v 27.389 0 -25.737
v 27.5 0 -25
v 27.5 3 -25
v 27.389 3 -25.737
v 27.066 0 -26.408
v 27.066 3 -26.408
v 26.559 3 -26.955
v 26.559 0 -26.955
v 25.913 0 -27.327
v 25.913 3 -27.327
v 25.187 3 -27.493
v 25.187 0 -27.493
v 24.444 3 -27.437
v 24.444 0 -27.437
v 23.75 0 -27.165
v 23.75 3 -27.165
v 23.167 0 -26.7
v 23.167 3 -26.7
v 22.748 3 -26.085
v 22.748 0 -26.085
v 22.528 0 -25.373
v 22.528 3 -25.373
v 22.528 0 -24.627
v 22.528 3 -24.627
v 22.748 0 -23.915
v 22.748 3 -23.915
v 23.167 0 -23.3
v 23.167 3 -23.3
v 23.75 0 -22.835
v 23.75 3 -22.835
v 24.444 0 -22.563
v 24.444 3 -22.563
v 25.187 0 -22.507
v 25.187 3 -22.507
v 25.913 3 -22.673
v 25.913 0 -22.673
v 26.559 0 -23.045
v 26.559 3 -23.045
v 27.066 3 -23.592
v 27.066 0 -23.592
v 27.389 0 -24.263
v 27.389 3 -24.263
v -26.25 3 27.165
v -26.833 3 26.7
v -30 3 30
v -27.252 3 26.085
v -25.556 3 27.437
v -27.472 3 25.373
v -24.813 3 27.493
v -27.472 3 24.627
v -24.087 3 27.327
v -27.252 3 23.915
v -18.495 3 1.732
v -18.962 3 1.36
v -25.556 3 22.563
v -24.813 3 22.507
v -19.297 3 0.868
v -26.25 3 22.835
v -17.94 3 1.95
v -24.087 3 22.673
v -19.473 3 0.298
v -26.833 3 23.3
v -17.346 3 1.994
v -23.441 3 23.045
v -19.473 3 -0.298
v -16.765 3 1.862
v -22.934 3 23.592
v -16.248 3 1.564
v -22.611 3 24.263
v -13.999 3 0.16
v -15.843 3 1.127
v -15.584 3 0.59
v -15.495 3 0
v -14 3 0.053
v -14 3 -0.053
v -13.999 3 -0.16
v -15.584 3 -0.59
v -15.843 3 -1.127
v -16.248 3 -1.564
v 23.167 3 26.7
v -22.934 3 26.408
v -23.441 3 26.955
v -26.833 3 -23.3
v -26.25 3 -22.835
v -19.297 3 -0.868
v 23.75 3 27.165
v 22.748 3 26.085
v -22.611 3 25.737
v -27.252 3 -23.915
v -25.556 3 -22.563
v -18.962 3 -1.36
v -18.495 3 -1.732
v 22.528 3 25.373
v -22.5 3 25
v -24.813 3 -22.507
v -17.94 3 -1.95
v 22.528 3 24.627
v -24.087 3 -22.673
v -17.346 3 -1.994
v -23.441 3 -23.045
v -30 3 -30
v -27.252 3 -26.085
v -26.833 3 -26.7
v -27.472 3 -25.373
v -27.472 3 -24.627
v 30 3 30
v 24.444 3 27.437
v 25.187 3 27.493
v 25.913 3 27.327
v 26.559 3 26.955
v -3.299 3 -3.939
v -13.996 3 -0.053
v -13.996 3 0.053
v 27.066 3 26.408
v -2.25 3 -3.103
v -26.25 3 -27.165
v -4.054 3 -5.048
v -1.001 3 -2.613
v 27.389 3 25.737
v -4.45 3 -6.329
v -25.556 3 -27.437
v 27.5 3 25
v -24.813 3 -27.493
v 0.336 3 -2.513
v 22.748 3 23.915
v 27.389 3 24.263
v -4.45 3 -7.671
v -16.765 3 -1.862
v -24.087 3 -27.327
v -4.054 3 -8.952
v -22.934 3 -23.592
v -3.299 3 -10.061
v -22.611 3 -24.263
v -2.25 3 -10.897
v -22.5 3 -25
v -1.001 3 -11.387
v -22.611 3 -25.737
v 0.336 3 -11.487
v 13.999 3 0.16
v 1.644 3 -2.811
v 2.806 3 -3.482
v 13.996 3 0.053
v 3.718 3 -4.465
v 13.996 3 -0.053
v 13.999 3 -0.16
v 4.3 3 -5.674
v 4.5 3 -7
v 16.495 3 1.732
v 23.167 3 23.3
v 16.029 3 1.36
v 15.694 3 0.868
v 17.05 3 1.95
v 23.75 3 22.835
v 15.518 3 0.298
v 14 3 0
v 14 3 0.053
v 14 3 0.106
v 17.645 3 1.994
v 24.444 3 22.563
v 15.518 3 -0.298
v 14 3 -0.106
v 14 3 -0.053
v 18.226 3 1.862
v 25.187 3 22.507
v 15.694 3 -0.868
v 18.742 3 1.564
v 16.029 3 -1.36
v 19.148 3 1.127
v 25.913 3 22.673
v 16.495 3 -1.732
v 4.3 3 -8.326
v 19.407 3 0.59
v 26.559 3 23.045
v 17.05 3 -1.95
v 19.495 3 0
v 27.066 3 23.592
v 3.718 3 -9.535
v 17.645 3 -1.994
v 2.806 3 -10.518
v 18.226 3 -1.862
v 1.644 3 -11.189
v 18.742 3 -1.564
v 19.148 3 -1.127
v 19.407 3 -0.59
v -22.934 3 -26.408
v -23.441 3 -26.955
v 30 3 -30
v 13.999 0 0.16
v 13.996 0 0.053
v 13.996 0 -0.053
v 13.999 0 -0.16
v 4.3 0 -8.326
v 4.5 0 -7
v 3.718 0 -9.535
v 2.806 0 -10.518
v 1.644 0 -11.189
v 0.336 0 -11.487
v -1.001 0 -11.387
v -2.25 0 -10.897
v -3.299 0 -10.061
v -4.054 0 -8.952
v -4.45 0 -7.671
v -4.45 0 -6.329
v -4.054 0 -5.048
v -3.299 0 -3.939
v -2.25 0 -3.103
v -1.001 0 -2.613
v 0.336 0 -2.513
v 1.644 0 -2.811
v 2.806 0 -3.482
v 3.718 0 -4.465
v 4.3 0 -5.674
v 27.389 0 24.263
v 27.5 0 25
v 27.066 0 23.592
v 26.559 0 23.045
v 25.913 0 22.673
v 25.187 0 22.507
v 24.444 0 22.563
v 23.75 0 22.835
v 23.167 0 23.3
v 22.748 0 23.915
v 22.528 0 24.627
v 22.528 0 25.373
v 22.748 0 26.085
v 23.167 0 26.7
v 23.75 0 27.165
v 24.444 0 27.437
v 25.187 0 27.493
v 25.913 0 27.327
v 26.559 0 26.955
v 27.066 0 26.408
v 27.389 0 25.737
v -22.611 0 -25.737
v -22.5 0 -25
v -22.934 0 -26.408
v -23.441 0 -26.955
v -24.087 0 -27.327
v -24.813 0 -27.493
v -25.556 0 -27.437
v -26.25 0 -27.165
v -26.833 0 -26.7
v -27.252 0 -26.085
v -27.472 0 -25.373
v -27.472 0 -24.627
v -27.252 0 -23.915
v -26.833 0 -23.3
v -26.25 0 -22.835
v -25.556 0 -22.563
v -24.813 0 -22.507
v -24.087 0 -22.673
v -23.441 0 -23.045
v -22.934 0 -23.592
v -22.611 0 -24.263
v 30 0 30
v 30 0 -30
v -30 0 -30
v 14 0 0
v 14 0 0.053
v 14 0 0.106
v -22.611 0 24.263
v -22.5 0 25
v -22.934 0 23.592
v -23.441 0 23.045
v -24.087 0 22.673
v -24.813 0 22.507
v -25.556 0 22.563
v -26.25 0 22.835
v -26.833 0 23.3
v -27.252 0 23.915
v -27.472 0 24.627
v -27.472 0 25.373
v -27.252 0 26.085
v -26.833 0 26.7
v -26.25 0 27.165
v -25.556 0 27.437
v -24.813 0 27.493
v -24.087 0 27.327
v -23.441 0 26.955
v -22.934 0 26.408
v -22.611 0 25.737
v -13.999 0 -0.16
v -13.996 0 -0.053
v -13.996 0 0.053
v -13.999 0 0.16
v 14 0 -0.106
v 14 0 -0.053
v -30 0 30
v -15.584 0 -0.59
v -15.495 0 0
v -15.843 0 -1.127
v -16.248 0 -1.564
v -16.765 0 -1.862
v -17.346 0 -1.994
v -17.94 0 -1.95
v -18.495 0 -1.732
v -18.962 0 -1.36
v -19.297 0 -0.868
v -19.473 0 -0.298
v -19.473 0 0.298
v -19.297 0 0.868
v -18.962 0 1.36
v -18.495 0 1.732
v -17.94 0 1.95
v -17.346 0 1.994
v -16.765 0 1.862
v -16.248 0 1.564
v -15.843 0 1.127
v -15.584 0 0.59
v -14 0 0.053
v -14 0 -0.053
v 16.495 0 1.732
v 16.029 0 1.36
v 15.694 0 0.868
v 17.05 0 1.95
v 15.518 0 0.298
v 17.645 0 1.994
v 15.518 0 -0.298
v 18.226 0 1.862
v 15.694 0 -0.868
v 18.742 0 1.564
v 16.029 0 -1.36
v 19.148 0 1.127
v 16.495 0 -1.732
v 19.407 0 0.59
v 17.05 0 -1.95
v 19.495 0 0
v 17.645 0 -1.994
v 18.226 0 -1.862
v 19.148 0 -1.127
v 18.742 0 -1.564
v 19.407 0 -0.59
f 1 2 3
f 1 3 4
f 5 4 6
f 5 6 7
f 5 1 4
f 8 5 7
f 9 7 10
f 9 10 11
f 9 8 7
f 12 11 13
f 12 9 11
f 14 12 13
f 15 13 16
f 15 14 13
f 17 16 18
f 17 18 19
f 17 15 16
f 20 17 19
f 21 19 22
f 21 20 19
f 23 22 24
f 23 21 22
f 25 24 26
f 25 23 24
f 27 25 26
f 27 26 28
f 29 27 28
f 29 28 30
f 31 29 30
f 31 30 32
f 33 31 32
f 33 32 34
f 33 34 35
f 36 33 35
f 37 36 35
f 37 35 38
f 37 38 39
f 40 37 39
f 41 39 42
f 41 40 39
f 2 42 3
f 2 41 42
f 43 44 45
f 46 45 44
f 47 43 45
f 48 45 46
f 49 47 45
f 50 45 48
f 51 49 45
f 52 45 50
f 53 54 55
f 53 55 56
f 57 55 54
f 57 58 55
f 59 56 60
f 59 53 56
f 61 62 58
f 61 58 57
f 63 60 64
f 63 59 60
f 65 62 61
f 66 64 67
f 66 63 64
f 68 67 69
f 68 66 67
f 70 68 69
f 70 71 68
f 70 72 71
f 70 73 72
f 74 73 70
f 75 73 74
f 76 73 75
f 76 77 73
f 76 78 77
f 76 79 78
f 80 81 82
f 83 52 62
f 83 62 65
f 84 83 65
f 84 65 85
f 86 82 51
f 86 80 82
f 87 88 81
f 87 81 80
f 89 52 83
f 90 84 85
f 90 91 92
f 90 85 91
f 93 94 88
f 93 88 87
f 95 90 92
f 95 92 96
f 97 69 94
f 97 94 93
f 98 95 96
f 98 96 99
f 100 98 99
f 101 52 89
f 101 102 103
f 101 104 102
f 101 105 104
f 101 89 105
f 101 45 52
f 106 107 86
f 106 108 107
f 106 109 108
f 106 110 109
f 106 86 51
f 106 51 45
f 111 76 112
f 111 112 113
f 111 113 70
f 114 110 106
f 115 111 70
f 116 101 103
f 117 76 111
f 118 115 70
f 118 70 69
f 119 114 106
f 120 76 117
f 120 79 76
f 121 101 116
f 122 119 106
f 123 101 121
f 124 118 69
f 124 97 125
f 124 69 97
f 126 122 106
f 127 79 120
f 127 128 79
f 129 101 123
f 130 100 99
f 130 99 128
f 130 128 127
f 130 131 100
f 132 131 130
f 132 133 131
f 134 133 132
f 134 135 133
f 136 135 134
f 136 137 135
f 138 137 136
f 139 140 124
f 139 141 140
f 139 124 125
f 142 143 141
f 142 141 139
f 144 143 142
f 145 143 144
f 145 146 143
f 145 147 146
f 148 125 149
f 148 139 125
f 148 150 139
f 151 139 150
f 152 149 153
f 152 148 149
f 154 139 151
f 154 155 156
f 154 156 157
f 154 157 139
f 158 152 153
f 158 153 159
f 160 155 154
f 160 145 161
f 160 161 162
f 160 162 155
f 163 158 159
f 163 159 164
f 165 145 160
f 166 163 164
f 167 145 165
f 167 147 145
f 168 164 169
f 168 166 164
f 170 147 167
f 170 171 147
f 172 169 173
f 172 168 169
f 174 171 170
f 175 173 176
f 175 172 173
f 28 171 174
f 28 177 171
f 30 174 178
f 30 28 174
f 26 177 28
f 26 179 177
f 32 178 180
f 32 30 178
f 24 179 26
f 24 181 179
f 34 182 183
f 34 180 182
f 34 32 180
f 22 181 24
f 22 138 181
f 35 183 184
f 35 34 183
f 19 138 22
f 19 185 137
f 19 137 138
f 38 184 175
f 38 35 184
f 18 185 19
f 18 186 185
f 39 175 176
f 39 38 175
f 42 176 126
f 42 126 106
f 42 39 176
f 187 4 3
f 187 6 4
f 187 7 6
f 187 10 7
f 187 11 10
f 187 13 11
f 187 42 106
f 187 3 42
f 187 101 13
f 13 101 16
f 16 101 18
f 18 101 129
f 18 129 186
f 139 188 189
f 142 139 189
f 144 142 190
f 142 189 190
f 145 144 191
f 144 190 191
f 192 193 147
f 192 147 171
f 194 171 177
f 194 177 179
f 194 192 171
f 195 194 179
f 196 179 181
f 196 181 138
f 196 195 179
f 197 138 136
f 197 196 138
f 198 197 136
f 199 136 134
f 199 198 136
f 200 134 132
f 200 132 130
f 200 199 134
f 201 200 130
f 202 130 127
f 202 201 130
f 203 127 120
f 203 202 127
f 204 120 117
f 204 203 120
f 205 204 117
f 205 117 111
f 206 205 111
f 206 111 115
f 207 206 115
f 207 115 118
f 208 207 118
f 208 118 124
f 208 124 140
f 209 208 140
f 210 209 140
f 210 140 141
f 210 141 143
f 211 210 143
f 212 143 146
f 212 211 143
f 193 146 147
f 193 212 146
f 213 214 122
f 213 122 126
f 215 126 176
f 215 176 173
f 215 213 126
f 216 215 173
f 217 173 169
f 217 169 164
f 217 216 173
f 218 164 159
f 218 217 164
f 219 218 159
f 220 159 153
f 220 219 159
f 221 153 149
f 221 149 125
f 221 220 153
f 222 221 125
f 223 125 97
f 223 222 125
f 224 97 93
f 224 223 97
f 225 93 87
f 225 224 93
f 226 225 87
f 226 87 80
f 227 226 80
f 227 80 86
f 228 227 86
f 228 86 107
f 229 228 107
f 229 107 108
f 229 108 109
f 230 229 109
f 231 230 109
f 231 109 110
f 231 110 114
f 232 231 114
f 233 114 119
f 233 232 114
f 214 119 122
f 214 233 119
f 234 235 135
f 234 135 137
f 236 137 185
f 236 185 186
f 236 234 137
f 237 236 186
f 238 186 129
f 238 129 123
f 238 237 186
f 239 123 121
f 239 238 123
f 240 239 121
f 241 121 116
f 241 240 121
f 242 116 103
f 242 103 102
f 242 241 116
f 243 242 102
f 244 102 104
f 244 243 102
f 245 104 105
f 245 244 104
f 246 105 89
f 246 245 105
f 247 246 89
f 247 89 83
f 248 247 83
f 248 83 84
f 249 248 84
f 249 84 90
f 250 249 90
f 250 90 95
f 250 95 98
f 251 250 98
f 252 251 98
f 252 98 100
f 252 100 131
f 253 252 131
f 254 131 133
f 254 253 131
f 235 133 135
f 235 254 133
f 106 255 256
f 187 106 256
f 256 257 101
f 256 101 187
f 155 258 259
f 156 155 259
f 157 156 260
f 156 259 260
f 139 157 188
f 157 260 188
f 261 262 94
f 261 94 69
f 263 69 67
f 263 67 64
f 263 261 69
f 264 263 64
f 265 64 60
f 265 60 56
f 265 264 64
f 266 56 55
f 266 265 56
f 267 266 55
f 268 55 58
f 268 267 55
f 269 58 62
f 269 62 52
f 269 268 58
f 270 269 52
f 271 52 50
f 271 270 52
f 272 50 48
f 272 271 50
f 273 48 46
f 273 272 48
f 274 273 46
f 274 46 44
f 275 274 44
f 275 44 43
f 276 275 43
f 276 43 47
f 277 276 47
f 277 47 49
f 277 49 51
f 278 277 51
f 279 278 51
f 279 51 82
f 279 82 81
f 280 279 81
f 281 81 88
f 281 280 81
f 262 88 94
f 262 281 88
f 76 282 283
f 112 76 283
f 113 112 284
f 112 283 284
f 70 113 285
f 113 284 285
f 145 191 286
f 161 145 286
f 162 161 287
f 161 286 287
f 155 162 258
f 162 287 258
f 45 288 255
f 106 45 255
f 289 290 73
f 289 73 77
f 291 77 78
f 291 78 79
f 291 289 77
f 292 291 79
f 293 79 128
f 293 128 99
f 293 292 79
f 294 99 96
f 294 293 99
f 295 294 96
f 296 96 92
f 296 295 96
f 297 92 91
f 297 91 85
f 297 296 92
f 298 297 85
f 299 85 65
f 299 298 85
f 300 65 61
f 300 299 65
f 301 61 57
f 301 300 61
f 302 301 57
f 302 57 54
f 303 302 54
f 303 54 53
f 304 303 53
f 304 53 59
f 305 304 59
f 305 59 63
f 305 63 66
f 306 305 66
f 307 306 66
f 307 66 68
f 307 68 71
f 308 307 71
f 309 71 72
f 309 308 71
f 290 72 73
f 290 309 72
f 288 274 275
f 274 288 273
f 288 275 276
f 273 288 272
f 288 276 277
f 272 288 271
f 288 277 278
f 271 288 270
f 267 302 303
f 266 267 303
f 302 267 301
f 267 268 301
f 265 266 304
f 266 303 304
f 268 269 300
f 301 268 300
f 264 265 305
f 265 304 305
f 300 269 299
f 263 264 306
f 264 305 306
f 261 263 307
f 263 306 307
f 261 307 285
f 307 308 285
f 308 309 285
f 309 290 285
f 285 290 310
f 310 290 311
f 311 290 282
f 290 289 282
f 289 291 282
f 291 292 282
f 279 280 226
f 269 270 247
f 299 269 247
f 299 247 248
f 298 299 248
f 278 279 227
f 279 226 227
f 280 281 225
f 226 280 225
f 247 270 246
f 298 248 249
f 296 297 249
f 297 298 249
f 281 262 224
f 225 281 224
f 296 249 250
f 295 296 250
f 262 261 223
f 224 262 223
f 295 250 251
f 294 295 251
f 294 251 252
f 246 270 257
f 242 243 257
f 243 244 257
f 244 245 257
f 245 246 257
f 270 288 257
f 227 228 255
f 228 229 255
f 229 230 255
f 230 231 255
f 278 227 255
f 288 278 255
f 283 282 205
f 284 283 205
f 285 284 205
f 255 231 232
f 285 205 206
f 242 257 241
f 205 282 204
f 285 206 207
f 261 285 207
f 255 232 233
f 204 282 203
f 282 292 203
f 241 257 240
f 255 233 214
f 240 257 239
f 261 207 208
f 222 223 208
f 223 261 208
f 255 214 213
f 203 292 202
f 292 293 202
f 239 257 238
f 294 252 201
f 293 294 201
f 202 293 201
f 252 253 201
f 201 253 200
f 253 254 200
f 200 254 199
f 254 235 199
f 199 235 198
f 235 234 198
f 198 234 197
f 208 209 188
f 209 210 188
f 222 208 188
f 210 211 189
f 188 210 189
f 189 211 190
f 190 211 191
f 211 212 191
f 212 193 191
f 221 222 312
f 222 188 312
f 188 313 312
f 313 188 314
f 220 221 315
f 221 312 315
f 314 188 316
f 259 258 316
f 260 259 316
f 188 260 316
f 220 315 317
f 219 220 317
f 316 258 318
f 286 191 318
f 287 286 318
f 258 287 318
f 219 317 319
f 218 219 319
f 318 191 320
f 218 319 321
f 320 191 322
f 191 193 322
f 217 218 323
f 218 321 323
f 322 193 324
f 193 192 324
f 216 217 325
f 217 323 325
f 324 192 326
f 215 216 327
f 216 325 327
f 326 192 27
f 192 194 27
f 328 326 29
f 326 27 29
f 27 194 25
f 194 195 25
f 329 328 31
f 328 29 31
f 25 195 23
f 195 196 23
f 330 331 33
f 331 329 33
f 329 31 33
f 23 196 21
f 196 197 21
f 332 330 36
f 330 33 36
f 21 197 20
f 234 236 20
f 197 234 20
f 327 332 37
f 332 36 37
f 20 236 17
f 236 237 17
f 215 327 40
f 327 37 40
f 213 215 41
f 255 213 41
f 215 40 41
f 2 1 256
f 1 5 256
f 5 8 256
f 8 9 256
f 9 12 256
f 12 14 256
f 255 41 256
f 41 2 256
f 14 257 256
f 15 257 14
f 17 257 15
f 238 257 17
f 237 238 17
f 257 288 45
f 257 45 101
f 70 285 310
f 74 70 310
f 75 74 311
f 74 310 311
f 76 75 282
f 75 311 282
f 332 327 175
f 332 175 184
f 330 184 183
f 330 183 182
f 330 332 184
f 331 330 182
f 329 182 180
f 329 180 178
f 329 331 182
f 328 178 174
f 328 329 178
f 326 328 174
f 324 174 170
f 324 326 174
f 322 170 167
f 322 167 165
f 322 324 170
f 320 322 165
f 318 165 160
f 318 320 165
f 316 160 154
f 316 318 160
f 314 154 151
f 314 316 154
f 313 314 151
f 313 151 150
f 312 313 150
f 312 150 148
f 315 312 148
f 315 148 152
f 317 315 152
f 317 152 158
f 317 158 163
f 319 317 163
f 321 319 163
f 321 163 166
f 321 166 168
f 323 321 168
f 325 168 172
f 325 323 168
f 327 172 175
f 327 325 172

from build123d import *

# Parameters (mm, degrees)
SKETCH1_W           = 60
SKETCH1_H           = 60
SKETCH1_R           = 2.5
SKETCH1_R_2         = 4.5
SKETCH1_R_3         = 2
BOSS_EXTRUDE1_DEPTH = 3


with BuildPart() as part:
    # Sketch1 → Boss-Extrude1 (new body)
    with BuildSketch(Plane(origin=(0, 0, 0), x_dir=(1, 0, 0), z_dir=(0, 1, 0))):
        Rectangle(SKETCH1_W, SKETCH1_H)
        with Locations((-25, -25)):
            Circle(SKETCH1_R, mode=Mode.SUBTRACT)
        with Locations((25, -25)):
            Circle(SKETCH1_R, mode=Mode.SUBTRACT)
        with BuildLine():
            Line((-13.555441712, -3.5), (-17.495441712, -3.5))
            ThreePointArc((-17.495441712, -3.5), (-20.995441712, 0), (-17.495441712, 3.5))
            Line((-17.495441712, 3.5), (-13.555441712, 3.5))
            ThreePointArc((-13.555441712, 3.5), (0, 14), (13.555441712, 3.5))
            Line((13.555441712, 3.5), (17.495441712, 3.5))
            ThreePointArc((17.495441712, 3.5), (20.995441712, 0), (17.495441712, -3.5))
            Line((17.495441712, -3.5), (13.555441712, -3.5))
            ThreePointArc((13.555441712, -3.5), (0, -14), (-13.555441712, -3.5))
        make_face(mode=Mode.SUBTRACT)
        with Locations((-25, 25)):
            Circle(SKETCH1_R, mode=Mode.SUBTRACT)
        with Locations((25, 25)):
            Circle(SKETCH1_R, mode=Mode.SUBTRACT)
        with BuildLine():
            ThreePointArc((-13.999088699, -0.159736057), (-13.878125858, -1.843264133), (-13.555441712, -3.5))
            ThreePointArc((-13.555441712, -3.5), (0, -14), (13.555441712, -3.5))
            ThreePointArc((13.555441712, -3.5), (13.878125858, -1.843264133), (13.999088699, -0.159736057))
            ThreePointArc((13.999088699, -0.159736057), (13.995441712, 0), (13.999088699, 0.159736057))
            ThreePointArc((13.999088699, 0.159736057), (13.878125858, 1.843264133), (13.555441712, 3.5))
            ThreePointArc((13.555441712, 3.5), (0, 14), (-13.555441712, 3.5))
            ThreePointArc((-13.555441712, 3.5), (-13.878125858, 1.843264133), (-13.999088699, 0.159736057))
            ThreePointArc((-13.999088699, 0.159736057), (-13.995441712, 0), (-13.999088699, -0.159736057))
        make_face()
        with Locations((0, 7)):
            Circle(SKETCH1_R_2, mode=Mode.SUBTRACT)
        with BuildLine():
            ThreePointArc((-17.495441712, 3.5), (-20.995441712, 0), (-17.495441712, -3.5))
            Line((-17.495441712, -3.5), (-13.555441712, -3.5))
            ThreePointArc((-13.555441712, -3.5), (-13.878125858, -1.843264133), (-13.999088699, -0.159736057))
            ThreePointArc((-13.999088699, -0.159736057), (-14, 0), (-13.999088699, 0.159736057))
            ThreePointArc((-13.999088699, 0.159736057), (-13.878125858, 1.843264133), (-13.555441712, 3.5))
            Line((-13.555441712, 3.5), (-17.495441712, 3.5))
        make_face()
        with Locations((-17.495441712, 0)):
            Circle(SKETCH1_R_3, mode=Mode.SUBTRACT)
        with BuildLine():
            ThreePointArc((13.999088699, -0.159736057), (13.878125858, -1.843264133), (13.555441712, -3.5))
            Line((13.555441712, -3.5), (17.495441712, -3.5))
            ThreePointArc((17.495441712, -3.5), (20.995441712, 0), (17.495441712, 3.5))
            Line((17.495441712, 3.5), (13.555441712, 3.5))
            ThreePointArc((13.555441712, 3.5), (13.878125858, 1.843264133), (13.999088699, 0.159736057))
            ThreePointArc((13.999088699, 0.159736057), (13.999772173, 0.079869328), (14, 0))
            ThreePointArc((14, 0), (13.999772173, -0.079869328), (13.999088699, -0.159736057))
        make_face()
        with Locations((17.495441712, 0)):
            Circle(SKETCH1_R_3, mode=Mode.SUBTRACT)
    extrude(amount=BOSS_EXTRUDE1_DEPTH)


solid = part.part
